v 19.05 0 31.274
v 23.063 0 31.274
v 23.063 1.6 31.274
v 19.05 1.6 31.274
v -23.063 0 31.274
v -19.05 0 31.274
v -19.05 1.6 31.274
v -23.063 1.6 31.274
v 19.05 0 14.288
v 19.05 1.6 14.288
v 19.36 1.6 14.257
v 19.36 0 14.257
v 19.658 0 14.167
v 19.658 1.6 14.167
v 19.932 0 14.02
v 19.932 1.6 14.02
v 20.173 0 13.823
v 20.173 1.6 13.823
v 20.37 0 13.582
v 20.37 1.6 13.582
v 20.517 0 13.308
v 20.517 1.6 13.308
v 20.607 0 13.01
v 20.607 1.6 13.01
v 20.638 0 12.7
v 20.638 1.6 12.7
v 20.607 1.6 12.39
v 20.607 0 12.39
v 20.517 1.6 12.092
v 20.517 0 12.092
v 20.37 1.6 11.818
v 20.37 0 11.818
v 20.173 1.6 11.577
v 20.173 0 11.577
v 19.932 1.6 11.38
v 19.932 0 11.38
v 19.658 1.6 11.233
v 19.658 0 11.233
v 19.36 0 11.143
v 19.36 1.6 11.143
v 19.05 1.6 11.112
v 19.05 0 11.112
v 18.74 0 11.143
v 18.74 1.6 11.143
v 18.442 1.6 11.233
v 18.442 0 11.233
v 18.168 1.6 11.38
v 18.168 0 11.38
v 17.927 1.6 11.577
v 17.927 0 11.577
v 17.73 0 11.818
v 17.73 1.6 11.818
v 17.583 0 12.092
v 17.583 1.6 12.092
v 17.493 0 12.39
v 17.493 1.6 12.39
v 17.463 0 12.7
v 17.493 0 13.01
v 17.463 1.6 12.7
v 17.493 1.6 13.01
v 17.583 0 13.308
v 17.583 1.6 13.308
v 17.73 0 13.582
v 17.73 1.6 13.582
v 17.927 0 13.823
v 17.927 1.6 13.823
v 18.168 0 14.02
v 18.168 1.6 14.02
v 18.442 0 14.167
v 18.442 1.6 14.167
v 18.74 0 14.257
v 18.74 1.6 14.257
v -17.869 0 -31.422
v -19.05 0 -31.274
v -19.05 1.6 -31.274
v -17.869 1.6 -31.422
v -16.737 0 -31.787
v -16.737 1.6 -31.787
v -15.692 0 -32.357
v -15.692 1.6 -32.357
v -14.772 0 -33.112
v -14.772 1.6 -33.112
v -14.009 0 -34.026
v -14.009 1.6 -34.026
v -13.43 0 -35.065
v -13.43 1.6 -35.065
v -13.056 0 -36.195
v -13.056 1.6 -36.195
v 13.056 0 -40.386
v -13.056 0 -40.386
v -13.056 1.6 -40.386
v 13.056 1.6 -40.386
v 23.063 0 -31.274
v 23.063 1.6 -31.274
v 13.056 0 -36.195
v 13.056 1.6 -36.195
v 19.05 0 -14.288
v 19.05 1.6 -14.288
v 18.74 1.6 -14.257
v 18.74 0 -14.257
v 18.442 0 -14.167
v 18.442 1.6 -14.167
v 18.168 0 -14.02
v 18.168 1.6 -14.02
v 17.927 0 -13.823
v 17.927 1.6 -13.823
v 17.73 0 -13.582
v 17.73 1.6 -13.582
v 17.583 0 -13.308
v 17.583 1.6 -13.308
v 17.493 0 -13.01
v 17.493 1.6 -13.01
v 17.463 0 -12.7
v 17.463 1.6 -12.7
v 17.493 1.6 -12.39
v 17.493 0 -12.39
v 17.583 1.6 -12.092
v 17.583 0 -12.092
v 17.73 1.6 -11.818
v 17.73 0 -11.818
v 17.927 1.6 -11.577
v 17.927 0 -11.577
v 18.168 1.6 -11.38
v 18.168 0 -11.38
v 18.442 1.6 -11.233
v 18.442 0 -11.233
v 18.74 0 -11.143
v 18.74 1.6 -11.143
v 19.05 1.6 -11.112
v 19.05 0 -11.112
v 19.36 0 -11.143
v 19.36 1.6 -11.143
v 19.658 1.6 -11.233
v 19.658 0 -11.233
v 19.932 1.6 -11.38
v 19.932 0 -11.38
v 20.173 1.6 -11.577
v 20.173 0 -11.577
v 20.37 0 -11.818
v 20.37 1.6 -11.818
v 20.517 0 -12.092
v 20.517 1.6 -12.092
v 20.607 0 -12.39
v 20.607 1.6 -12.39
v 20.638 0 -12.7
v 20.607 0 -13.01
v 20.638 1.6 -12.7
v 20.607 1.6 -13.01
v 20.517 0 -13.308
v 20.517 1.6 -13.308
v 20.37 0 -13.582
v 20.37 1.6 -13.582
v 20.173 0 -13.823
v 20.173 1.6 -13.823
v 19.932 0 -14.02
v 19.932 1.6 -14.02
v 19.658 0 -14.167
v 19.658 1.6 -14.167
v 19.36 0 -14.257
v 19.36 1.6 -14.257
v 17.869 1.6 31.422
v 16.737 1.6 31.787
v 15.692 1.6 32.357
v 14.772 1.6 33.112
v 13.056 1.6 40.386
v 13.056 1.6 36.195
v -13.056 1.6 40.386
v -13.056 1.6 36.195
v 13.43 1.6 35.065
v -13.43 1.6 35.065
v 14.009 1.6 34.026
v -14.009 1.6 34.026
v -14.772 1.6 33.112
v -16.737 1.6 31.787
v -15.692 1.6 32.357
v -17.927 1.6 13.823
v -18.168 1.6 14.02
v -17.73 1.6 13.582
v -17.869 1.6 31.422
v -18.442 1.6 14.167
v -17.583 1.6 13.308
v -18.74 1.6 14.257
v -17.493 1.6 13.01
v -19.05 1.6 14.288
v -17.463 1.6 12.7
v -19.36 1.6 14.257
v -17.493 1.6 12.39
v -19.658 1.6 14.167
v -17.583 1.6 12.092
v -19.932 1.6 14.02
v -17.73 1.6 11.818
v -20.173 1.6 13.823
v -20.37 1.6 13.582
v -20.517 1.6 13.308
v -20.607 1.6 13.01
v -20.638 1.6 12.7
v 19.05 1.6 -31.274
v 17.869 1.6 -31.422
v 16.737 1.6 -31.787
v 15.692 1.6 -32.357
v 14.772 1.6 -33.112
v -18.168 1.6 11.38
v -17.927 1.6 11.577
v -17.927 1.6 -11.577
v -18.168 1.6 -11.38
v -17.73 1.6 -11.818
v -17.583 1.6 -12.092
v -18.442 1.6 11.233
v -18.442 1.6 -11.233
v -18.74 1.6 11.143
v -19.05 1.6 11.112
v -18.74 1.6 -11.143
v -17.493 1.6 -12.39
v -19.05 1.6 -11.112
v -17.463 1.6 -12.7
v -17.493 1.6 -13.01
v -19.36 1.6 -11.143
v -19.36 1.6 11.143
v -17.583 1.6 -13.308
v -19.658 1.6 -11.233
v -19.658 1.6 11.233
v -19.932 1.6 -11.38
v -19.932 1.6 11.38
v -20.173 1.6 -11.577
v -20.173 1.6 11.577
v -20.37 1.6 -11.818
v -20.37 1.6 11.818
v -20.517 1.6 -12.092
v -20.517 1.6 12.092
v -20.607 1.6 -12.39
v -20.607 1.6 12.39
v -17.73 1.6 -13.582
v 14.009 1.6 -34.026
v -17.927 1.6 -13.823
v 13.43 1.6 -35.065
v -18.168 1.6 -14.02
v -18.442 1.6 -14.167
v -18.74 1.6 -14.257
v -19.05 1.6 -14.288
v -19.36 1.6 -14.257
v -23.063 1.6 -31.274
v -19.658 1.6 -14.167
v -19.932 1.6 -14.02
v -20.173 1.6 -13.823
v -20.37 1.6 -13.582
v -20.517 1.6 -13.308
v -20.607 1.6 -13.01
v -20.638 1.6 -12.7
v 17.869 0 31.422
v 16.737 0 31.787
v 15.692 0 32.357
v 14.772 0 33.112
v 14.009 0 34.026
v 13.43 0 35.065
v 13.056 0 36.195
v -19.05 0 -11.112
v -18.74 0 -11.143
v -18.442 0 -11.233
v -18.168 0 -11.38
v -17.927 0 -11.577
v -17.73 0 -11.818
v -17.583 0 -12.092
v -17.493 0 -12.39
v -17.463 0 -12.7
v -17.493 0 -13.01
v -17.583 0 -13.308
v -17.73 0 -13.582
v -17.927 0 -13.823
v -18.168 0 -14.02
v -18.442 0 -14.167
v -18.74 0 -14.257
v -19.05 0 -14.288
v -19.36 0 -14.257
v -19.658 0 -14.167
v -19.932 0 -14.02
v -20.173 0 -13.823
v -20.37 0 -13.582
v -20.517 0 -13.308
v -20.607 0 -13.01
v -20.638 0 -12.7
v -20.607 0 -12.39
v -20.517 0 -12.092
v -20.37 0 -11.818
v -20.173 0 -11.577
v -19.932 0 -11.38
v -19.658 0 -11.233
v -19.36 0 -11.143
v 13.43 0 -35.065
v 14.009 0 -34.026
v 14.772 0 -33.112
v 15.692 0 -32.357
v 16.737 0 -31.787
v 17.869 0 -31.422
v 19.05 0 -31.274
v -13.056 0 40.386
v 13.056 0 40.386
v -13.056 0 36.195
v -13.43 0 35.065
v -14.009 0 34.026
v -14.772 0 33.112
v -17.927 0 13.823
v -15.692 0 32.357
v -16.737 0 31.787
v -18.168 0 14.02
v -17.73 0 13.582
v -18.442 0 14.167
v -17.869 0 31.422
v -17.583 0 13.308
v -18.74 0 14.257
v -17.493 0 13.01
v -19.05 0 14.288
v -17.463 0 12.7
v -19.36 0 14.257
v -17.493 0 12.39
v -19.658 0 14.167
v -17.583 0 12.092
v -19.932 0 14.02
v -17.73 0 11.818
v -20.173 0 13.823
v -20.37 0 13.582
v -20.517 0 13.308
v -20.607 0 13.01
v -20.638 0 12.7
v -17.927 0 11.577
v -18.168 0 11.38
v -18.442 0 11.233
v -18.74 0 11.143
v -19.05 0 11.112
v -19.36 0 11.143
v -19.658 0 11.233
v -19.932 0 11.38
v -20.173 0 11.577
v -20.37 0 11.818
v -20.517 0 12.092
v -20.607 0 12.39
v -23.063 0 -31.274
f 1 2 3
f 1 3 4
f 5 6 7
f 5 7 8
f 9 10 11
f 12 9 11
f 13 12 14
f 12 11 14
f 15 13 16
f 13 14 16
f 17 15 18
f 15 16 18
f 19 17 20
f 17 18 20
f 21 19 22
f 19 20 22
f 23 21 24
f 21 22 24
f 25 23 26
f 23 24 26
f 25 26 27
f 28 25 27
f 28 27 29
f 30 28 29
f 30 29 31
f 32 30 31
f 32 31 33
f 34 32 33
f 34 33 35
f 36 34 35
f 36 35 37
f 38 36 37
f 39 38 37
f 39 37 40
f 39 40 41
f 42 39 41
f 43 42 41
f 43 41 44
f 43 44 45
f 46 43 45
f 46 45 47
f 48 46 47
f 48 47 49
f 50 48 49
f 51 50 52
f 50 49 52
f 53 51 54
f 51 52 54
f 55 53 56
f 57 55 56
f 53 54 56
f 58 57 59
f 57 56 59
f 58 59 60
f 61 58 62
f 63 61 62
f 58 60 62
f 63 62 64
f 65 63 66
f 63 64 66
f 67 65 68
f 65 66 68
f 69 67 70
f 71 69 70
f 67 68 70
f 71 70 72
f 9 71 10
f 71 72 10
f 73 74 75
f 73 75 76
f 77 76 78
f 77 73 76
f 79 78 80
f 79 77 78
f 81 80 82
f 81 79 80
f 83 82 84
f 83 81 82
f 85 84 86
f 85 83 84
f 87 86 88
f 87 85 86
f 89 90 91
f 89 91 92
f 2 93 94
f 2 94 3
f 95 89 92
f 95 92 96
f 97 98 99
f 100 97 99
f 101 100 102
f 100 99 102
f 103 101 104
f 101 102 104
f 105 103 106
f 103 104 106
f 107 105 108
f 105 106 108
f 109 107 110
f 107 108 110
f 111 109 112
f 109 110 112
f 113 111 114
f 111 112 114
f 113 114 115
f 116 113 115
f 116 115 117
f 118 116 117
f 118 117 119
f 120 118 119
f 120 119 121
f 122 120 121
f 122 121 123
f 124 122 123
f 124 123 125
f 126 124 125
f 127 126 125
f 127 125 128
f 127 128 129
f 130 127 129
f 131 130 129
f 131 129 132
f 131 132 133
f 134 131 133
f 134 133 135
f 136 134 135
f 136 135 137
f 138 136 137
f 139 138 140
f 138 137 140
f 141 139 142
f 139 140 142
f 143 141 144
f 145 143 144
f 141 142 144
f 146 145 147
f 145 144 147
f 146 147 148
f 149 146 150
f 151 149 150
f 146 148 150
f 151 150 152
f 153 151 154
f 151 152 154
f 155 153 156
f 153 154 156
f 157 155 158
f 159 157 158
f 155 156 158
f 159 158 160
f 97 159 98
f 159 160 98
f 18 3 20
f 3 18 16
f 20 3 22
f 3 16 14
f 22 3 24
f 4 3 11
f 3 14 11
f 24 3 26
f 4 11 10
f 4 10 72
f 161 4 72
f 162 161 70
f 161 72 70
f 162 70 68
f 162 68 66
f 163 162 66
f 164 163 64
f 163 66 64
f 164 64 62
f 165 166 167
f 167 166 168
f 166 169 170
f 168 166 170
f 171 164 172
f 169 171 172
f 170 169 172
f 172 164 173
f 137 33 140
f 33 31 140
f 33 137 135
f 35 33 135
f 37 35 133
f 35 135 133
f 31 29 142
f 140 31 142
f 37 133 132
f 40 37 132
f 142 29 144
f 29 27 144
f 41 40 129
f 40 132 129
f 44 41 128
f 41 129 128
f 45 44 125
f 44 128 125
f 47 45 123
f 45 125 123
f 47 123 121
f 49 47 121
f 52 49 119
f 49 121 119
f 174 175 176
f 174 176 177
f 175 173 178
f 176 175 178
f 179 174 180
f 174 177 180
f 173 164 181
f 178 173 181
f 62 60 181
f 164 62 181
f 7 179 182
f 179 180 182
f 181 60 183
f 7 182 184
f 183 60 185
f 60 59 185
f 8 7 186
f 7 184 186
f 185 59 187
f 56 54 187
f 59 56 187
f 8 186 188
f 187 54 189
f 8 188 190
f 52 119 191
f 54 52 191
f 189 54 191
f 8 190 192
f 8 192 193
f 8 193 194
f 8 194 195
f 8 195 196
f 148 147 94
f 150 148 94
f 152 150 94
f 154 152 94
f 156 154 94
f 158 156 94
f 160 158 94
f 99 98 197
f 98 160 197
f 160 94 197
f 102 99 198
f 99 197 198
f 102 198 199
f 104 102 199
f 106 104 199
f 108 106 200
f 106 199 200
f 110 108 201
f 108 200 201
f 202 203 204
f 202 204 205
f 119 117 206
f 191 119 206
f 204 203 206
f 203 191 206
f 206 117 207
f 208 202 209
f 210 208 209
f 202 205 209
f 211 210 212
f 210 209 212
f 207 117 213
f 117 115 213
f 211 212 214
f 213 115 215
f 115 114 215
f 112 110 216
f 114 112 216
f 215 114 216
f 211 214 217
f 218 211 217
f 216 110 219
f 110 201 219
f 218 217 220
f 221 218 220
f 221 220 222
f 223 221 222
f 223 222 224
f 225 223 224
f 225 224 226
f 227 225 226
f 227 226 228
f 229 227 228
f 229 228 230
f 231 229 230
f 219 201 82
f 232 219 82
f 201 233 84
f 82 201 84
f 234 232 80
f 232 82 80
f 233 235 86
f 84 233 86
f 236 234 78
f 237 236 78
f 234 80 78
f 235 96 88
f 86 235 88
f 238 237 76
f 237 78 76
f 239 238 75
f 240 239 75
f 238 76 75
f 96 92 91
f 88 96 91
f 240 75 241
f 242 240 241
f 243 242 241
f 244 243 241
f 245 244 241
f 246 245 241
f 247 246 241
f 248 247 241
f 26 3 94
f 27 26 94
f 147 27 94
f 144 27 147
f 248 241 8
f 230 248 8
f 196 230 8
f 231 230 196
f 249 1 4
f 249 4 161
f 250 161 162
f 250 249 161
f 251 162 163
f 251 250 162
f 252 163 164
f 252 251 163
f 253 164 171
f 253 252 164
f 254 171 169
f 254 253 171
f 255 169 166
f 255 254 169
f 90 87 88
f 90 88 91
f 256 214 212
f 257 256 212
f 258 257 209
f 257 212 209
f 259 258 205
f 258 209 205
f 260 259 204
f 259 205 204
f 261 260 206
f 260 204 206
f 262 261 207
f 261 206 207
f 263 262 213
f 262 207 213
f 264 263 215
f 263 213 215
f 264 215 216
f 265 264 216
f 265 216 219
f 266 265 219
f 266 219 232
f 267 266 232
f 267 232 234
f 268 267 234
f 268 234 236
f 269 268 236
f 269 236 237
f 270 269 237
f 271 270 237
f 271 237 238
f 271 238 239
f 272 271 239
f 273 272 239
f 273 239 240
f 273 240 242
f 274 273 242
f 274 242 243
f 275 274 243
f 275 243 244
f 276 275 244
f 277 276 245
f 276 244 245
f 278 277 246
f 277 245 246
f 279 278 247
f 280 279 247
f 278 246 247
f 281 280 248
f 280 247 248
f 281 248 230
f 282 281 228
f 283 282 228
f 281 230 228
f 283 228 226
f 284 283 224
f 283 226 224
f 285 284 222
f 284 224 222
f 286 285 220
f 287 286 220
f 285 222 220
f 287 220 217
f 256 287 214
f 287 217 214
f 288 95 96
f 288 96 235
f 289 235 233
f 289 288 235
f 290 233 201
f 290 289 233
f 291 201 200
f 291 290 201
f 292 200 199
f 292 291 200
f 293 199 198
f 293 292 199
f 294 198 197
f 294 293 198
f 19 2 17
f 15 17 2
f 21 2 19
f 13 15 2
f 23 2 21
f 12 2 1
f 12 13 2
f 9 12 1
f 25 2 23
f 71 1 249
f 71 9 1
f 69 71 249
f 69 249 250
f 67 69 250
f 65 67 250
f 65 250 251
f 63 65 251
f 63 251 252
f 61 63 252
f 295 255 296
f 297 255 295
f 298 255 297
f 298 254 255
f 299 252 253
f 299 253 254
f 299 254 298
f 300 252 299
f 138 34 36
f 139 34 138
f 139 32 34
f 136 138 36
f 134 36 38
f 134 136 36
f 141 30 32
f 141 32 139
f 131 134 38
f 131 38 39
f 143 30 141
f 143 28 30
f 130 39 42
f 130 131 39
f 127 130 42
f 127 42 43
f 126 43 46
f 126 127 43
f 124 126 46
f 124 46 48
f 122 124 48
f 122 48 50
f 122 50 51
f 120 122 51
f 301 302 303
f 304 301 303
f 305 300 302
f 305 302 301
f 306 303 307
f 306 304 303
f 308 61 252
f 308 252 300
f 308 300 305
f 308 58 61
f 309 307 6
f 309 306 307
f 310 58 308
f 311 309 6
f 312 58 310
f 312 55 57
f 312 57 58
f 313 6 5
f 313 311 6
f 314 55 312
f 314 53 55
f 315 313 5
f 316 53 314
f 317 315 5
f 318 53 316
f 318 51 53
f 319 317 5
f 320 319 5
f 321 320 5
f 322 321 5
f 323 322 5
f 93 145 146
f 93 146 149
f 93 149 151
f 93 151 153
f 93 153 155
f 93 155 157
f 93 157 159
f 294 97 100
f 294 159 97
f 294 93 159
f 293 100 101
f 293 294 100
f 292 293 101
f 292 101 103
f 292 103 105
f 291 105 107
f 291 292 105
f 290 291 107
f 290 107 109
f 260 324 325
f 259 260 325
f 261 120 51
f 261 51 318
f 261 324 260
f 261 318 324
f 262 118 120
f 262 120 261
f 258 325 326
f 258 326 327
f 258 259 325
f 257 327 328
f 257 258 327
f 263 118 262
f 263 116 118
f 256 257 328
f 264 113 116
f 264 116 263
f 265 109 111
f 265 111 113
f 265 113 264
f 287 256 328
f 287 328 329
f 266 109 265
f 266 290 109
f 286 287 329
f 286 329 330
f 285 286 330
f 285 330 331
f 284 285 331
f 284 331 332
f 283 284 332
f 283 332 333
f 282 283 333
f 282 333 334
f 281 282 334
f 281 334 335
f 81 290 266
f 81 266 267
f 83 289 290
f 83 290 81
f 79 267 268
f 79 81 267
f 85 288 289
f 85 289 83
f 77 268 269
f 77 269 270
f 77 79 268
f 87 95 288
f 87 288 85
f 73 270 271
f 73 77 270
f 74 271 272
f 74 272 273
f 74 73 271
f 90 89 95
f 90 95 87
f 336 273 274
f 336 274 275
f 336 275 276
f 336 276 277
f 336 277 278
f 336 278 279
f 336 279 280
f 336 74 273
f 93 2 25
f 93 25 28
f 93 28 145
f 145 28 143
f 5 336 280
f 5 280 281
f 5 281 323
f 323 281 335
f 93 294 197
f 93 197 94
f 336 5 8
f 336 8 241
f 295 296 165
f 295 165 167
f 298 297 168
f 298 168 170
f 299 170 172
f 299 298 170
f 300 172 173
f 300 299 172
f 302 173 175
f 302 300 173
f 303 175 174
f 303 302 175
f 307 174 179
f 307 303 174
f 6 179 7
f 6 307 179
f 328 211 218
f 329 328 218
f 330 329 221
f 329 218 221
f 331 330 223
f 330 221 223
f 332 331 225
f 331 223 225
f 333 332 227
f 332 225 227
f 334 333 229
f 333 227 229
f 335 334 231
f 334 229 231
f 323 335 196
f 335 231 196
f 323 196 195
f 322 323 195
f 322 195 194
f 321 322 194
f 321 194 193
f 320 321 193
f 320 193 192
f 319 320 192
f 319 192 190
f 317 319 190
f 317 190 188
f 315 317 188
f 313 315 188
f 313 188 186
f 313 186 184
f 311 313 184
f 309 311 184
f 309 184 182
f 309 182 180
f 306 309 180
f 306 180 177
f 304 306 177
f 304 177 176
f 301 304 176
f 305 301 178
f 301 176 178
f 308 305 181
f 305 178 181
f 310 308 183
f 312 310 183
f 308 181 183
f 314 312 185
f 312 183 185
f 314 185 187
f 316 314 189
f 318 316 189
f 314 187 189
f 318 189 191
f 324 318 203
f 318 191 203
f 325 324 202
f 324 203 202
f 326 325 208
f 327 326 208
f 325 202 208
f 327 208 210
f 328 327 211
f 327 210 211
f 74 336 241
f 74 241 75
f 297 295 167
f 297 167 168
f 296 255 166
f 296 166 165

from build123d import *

# Parameters (mm, degrees)
BOSS_EXTRUDE1_DEPTH = 1.6
SKETCH2_R           = 1.5875
CUT_EXTRUDE1_DEPTH  = 47.534935159


with BuildPart() as part:
    # Sketch1 → Boss-Extrude1 (new body)
    with BuildSketch(Plane(origin=(0, 0, 0), x_dir=(1, 0, 0), z_dir=(0, 1, 0))):
        with BuildLine():
            Line((-23.0632, 31.273950746), (-19.05, 31.273950746))
            ThreePointArc((-19.05, 31.273950746), (-15.214318255, 32.713055735), (-13.055721082, 36.195))
            Line((-13.055721082, 36.195), (-13.055721082, 40.386))
            Line((-13.055721082, 40.386), (13.055721082, 40.386))
            Line((13.055721082, 40.386), (13.055721082, 36.195))
            ThreePointArc((13.055721082, 36.195), (15.214318255, 32.713055735), (19.05, 31.273950746))
            Line((19.05, 31.273950746), (23.0632, 31.273950746))
            Line((23.0632, 31.273950746), (23.0632, -31.273950746))
            Line((23.0632, -31.273950746), (19.05, -31.273950746))
            ThreePointArc((19.05, -31.273950746), (15.214318255, -32.713055735), (13.055721082, -36.195))
            Line((13.055721082, -36.195), (13.055721082, -40.386))
            Line((13.055721082, -40.386), (-13.055721082, -40.386))
            Line((-13.055721082, -40.386), (-13.055721082, -36.195))
            ThreePointArc((-13.055721082, -36.195), (-15.214318255, -32.713055735), (-19.05, -31.273950746))
            Line((-19.05, -31.273950746), (-23.0632, -31.273950746))
            Line((-23.0632, -31.273950746), (-23.0632, 0))
            Line((-23.0632, 0), (-23.0632, 31.273950746))
        make_face()
    extrude(amount=BOSS_EXTRUDE1_DEPTH)

    # Sketch2 → Cut-Extrude1 (cut, through all)
    with BuildSketch(Plane(origin=(0, 1.6, 0), x_dir=(1, 0, 0), z_dir=(0, 1, 0))):
        with Locations(Location((-19.05, 12.7, 0), (0, 0, 270))):
            Circle(SKETCH2_R)
        with Locations(Location((19.05, 12.7, 0), (0, 0, 90))):
            Circle(SKETCH2_R)
        with Locations(Location((19.05, -12.7, 0), (0, 0, 270))):
            Circle(SKETCH2_R)
        with Locations(Location((-19.05, -12.7, 0), (0, 0, 90))):
            Circle(SKETCH2_R)
    extrude(amount=-CUT_EXTRUDE1_DEPTH, mode=Mode.SUBTRACT)


solid = part.part
